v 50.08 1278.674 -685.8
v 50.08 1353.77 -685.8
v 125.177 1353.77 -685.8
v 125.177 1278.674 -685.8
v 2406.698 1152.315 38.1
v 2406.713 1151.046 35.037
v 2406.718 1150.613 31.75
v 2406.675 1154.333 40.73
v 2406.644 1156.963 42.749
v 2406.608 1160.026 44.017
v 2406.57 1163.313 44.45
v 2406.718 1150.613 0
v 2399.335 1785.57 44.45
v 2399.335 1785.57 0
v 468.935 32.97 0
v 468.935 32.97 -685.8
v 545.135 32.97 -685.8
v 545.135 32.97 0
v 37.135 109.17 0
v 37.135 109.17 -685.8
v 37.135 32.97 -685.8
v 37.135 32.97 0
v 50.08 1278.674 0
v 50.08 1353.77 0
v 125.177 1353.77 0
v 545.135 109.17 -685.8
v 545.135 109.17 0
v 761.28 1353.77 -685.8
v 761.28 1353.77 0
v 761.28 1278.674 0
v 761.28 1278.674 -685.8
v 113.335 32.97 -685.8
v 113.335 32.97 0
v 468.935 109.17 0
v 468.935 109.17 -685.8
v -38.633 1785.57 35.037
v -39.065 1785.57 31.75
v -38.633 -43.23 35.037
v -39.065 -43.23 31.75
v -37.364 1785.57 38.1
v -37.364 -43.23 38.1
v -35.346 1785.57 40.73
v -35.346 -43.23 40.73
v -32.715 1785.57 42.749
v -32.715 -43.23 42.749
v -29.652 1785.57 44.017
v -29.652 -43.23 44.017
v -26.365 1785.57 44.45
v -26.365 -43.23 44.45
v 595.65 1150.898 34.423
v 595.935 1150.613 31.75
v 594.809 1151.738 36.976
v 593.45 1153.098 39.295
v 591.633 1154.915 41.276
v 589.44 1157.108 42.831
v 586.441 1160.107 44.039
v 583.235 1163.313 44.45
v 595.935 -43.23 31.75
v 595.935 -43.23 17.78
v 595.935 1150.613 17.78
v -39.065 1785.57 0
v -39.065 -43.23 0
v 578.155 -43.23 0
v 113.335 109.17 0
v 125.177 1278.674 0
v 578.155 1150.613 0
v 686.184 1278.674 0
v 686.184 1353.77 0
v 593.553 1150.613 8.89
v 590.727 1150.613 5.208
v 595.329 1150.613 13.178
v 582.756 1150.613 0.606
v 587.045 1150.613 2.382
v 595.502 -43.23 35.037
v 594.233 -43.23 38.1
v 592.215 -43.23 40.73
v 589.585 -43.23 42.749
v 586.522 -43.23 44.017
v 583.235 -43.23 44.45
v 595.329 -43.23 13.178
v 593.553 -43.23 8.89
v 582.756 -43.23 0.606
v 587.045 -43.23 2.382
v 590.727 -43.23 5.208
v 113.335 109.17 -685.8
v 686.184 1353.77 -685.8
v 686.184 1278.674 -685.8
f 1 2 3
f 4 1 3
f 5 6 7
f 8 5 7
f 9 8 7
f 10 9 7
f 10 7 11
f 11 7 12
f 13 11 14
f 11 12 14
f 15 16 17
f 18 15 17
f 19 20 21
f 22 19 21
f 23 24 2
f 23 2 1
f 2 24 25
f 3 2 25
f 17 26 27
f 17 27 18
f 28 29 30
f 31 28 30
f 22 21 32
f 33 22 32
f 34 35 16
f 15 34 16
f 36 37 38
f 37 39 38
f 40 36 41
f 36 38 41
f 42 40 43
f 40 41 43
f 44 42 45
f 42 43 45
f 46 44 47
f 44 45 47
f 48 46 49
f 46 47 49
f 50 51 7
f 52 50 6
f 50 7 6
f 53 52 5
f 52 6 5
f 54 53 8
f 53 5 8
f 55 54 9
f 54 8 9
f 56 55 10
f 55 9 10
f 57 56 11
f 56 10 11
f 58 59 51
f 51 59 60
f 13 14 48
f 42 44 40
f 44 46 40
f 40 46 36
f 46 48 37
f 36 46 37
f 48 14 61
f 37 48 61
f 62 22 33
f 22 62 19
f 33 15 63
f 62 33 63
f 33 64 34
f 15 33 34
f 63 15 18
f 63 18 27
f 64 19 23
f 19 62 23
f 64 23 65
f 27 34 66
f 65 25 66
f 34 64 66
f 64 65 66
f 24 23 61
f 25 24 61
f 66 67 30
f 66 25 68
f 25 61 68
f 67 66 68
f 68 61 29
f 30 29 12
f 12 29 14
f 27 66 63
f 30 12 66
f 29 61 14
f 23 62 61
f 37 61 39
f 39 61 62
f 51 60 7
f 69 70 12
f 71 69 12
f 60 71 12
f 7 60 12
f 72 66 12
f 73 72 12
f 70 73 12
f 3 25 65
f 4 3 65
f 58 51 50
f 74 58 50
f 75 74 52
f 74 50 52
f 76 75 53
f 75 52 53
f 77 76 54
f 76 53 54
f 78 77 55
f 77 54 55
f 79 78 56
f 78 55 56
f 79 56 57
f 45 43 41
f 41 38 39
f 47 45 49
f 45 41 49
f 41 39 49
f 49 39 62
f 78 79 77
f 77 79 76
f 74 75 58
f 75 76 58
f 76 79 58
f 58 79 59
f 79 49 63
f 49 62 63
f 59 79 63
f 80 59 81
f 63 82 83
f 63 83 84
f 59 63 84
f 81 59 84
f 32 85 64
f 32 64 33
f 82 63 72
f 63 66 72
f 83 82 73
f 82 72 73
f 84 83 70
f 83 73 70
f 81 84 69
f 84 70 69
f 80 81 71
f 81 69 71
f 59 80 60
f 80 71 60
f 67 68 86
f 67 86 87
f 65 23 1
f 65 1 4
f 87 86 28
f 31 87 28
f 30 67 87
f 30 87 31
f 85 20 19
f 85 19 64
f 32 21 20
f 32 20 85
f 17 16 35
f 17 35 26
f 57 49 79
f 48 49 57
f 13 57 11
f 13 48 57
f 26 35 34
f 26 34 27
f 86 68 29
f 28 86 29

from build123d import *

# Parameters (mm, degrees)
F1_DEPTH = 44.45
F2_R     = 12.7
F3_R     = 17.78
F4_W     = 76.2
F4_H     = 76.2
F4_W_2   = 75.0966481864
F4_H_2   = 75.0966481864
F5_DEPTH = 685.8


# Not quite as in the source:
# - a feature names something its author has since deleted; it is built from what else it names


with BuildPart() as f1:
    # F0 (on Top) → F1 (new body)
    with BuildSketch(Plane.XY):
        Polygon((2406.7179050011, 1150.6131630864), (2399.3345719218, 1785.5702375352), (-39.0654280782, 1785.5702375352), (-39.0654280782, -43.2297624648), (595.9345719218, -43.2297624648), (595.9345719218, 1150.6131630864), align=None)
    extrude(amount=F1_DEPTH)

    # F2
    f2_edges = [f1.edges().sort_by_distance(p)[0] for p in [
        (595.934572, 553.6917, 44.45),
        (1501.326238, 1150.613163, 44.45),
        (-39.065428, 871.170238, 44.45),
    ]]
    fillet(f2_edges, radius=F2_R)

    # F3
    f3_edges = [f1.edges().sort_by_distance(p)[0] for p in [
        (595.934572, 553.6917, 0),
    ]]
    fillet(f3_edges, radius=F3_R)

    # F4 (on face) → F5 (join)
    with BuildSketch(Plane(origin=(0, 0, 0), x_dir=(1, 0, 0), z_dir=(0, 0, -1))):
        with Locations((75.2345719218, -71.0702375352)):
            Rectangle(F4_W, F4_H)
        with Locations((507.0345719218, -71.0702375352)):
            Rectangle(F4_W, F4_H)
        with Locations((723.7319641083, -1316.221913442)):
            Rectangle(F4_W_2, F4_H_2)
        with Locations((87.6286122948, -1316.221913442)):
            Rectangle(F4_W_2, F4_H_2)
    extrude(amount=F5_DEPTH)


solid = f1.part
